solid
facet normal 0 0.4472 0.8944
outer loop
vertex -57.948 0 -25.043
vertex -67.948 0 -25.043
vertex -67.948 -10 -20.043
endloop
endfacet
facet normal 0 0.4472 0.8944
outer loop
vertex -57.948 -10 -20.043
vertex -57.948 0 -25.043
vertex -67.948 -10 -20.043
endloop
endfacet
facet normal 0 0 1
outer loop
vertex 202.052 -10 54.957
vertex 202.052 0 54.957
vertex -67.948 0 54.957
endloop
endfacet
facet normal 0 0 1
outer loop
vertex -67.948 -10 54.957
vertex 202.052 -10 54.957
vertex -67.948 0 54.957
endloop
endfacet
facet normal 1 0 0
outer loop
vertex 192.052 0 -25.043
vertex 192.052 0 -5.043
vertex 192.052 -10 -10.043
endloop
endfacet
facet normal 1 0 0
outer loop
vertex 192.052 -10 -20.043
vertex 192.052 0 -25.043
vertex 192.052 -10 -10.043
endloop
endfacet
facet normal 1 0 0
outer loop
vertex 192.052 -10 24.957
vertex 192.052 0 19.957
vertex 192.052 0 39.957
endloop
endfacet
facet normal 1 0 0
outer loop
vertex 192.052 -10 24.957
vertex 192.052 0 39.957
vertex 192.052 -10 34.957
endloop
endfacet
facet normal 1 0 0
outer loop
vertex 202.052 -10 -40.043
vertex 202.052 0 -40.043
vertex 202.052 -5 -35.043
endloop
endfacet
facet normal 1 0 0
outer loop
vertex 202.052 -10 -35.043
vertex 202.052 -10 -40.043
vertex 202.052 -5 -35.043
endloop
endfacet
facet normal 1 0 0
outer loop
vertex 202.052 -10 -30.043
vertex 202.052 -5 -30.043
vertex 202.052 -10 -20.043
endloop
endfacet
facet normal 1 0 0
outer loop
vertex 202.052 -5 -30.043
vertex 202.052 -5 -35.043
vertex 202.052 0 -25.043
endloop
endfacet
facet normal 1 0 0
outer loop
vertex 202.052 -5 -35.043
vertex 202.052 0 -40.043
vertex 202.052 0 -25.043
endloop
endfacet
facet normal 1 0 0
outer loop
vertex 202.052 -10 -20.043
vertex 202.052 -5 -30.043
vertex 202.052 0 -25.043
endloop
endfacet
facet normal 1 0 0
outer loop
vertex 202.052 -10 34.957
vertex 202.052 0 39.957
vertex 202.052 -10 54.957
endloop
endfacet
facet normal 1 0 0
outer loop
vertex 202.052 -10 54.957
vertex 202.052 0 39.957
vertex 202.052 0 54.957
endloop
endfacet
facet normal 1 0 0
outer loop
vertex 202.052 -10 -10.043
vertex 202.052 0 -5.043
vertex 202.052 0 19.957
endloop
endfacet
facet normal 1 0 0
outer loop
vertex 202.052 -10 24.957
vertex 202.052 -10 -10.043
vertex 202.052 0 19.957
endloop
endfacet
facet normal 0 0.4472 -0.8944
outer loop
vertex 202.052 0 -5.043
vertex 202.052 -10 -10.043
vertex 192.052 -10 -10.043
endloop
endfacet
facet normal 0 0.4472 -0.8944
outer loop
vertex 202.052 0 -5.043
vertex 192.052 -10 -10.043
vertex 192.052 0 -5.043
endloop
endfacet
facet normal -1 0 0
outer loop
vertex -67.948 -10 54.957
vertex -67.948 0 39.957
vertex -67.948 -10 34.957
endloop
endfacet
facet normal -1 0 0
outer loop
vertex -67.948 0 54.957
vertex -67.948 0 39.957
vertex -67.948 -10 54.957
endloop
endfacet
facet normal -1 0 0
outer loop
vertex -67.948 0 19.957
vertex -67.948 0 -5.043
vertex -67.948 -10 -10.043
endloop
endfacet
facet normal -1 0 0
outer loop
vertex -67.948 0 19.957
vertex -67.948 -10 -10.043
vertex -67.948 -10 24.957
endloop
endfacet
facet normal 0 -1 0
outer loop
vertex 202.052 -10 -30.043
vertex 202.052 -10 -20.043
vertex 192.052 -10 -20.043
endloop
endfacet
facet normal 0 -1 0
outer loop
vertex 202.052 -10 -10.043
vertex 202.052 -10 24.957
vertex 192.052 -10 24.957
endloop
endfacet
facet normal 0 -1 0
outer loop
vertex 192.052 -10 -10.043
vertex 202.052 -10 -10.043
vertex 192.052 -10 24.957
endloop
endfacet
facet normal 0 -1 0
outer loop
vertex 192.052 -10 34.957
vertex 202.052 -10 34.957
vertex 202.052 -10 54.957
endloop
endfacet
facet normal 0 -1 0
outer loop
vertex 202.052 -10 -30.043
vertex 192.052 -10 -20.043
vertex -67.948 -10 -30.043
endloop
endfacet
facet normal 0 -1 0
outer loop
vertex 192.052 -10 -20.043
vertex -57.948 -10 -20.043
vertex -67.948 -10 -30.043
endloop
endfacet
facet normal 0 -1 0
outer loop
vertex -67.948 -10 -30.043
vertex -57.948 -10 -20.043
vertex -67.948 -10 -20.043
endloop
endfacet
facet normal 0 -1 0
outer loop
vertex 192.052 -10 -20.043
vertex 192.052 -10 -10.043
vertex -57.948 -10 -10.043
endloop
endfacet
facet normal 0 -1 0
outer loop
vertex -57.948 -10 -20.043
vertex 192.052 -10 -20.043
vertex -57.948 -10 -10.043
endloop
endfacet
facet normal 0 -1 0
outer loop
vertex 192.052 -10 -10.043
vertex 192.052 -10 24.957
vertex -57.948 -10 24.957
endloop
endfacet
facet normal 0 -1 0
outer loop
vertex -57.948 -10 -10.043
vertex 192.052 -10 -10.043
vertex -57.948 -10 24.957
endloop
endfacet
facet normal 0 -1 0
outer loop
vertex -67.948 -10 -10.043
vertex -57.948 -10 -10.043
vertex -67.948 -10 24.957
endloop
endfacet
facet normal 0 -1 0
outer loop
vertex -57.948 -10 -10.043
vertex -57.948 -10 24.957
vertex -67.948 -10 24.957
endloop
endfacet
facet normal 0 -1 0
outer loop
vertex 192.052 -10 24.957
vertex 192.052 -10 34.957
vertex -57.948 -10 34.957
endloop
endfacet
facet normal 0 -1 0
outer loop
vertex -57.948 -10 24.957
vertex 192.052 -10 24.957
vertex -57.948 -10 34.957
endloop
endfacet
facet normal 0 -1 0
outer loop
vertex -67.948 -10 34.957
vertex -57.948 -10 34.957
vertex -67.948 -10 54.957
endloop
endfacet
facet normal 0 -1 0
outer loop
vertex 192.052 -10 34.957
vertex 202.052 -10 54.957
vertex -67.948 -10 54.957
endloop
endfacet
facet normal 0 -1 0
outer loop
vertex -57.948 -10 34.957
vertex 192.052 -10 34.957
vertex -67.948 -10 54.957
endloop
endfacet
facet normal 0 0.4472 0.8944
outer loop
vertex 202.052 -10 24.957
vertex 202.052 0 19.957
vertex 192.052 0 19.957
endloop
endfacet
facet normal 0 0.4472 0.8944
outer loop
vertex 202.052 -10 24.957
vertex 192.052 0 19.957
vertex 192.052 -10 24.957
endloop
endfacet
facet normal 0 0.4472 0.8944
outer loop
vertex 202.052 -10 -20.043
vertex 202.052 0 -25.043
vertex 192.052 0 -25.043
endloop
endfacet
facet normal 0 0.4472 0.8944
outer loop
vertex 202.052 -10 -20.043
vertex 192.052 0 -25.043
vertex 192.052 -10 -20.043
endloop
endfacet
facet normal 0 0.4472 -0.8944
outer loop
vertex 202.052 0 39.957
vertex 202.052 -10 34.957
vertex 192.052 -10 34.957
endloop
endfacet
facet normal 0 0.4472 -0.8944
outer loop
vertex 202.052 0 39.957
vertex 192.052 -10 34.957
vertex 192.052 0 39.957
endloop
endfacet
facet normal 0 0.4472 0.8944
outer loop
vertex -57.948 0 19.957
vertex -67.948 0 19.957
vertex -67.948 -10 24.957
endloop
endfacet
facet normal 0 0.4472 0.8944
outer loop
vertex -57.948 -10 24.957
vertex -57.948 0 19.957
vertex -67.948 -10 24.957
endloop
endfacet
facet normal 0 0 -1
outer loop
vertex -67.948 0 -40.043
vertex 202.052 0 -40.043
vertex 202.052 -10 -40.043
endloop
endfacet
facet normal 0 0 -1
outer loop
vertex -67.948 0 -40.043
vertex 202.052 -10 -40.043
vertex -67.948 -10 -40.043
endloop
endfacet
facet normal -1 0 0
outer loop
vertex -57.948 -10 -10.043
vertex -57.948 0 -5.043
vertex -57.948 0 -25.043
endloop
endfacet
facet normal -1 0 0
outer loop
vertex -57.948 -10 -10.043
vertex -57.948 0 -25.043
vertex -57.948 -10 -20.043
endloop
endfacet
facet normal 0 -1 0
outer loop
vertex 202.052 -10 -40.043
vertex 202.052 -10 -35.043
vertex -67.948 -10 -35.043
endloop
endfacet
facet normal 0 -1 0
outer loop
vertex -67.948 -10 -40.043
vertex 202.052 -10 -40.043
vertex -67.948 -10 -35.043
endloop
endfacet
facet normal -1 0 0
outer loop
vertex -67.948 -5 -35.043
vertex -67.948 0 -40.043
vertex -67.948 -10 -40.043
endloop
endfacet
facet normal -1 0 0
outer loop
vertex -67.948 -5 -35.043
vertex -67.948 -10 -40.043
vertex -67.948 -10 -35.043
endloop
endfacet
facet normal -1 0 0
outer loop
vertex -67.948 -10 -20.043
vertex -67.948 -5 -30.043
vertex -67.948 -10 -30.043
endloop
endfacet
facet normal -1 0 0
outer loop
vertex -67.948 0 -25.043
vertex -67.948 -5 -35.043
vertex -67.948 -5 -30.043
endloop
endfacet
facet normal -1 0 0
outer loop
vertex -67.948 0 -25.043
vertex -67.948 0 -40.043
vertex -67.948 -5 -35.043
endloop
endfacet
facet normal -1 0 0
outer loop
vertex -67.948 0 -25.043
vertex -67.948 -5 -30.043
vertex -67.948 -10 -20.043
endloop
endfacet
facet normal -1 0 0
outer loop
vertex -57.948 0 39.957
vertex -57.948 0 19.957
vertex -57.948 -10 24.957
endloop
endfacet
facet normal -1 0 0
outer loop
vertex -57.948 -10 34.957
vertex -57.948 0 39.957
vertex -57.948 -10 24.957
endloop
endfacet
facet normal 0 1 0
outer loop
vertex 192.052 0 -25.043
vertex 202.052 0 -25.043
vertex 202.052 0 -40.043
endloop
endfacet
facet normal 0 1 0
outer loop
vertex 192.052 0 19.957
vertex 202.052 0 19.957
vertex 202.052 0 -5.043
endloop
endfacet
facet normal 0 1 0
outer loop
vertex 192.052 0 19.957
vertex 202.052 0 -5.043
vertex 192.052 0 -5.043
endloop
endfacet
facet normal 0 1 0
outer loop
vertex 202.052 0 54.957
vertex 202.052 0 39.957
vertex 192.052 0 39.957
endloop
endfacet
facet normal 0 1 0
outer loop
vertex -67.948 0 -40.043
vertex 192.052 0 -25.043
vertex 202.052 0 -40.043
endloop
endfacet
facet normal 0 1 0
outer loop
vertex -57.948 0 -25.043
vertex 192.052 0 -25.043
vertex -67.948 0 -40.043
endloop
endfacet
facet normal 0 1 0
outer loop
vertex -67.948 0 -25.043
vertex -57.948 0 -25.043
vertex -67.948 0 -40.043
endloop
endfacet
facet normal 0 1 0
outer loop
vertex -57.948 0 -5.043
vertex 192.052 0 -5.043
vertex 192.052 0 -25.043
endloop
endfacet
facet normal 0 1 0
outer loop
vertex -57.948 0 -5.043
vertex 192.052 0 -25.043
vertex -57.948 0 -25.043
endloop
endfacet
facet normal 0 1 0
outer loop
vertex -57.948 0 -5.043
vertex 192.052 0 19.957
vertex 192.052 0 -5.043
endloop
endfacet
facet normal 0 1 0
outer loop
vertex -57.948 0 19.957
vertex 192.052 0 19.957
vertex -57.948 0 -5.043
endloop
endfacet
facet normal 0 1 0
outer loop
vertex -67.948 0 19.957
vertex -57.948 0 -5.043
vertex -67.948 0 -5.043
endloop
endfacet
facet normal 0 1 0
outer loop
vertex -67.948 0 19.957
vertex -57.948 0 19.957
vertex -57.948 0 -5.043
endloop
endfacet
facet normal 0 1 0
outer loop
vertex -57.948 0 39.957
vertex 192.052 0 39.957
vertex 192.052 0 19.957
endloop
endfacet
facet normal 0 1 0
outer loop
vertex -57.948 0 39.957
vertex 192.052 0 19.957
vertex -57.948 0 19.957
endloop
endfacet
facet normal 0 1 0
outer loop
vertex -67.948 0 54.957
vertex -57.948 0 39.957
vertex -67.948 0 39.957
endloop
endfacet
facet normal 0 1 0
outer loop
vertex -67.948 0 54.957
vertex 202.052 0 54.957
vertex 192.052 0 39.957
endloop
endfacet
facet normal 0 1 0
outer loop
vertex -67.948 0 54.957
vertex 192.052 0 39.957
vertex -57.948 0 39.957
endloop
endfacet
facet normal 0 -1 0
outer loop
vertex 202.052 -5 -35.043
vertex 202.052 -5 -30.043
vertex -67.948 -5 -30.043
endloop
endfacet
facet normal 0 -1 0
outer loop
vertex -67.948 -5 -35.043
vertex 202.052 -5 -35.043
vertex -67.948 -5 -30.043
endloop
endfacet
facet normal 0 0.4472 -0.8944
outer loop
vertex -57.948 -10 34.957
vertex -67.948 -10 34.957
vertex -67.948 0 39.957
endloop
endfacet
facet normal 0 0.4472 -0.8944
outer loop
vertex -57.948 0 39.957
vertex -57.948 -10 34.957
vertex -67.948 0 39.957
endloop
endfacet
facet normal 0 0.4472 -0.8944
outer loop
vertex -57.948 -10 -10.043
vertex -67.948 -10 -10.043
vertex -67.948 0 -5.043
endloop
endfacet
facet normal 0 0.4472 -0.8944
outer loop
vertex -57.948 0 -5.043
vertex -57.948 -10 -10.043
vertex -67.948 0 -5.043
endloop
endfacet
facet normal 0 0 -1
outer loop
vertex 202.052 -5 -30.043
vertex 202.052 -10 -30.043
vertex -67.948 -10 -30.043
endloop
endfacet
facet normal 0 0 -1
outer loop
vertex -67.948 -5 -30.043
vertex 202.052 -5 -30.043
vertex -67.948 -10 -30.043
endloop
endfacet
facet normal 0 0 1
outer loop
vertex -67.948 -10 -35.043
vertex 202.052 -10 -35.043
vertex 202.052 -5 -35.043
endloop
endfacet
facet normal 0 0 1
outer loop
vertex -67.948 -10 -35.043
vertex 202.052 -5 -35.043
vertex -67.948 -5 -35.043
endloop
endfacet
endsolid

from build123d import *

# Parameters (mm, degrees)
F0_W     = 135
F0_H     = 95
F1_DEPTH = 10
F3_DEPTH = 10
F4_W     = 135
F4_H     = 5
F5_DEPTH = 5


with BuildPart() as f1:
    # F0 (on Front) → F1 (new body)
    with BuildSketch(Plane.XZ):
        with Locations((-0.448078, 7.457405)):
            Rectangle(F0_W, F0_H)
    extrude(amount=F1_DEPTH)

    # F2 (on face) → F3 (cut)
    with BuildSketch(Plane(origin=(-67.948078, 0, 0), x_dir=(0, -1, 0), z_dir=(-1, 0, 0))):
        Polygon((10, 34.957405), (0, 39.957405), (0, 19.957405), (10, 24.957405), align=None)
        Polygon((10, -10.042595), (0, -5.042595), (0, -25.042595), (10, -20.042595), align=None)
    extrude(amount=-F3_DEPTH, mode=Mode.SUBTRACT)

    # F4 (on face) → F5 (cut)
    with BuildSketch(Plane.XZ.offset(10)):
        with Locations((-0.448078, -32.542595)):
            Rectangle(F4_W, F4_H)
    extrude(amount=-F5_DEPTH, mode=Mode.SUBTRACT)

    # F6: F1 across face


with BuildPart() as f1_1:
    add(f1.part)
    add(f1.part.mirror(Plane(origin=(67.051922, -4.932432, 8.538486), x_dir=(0, 1, 0), z_dir=(1, 0, 0))))


solid = f1_1.part
